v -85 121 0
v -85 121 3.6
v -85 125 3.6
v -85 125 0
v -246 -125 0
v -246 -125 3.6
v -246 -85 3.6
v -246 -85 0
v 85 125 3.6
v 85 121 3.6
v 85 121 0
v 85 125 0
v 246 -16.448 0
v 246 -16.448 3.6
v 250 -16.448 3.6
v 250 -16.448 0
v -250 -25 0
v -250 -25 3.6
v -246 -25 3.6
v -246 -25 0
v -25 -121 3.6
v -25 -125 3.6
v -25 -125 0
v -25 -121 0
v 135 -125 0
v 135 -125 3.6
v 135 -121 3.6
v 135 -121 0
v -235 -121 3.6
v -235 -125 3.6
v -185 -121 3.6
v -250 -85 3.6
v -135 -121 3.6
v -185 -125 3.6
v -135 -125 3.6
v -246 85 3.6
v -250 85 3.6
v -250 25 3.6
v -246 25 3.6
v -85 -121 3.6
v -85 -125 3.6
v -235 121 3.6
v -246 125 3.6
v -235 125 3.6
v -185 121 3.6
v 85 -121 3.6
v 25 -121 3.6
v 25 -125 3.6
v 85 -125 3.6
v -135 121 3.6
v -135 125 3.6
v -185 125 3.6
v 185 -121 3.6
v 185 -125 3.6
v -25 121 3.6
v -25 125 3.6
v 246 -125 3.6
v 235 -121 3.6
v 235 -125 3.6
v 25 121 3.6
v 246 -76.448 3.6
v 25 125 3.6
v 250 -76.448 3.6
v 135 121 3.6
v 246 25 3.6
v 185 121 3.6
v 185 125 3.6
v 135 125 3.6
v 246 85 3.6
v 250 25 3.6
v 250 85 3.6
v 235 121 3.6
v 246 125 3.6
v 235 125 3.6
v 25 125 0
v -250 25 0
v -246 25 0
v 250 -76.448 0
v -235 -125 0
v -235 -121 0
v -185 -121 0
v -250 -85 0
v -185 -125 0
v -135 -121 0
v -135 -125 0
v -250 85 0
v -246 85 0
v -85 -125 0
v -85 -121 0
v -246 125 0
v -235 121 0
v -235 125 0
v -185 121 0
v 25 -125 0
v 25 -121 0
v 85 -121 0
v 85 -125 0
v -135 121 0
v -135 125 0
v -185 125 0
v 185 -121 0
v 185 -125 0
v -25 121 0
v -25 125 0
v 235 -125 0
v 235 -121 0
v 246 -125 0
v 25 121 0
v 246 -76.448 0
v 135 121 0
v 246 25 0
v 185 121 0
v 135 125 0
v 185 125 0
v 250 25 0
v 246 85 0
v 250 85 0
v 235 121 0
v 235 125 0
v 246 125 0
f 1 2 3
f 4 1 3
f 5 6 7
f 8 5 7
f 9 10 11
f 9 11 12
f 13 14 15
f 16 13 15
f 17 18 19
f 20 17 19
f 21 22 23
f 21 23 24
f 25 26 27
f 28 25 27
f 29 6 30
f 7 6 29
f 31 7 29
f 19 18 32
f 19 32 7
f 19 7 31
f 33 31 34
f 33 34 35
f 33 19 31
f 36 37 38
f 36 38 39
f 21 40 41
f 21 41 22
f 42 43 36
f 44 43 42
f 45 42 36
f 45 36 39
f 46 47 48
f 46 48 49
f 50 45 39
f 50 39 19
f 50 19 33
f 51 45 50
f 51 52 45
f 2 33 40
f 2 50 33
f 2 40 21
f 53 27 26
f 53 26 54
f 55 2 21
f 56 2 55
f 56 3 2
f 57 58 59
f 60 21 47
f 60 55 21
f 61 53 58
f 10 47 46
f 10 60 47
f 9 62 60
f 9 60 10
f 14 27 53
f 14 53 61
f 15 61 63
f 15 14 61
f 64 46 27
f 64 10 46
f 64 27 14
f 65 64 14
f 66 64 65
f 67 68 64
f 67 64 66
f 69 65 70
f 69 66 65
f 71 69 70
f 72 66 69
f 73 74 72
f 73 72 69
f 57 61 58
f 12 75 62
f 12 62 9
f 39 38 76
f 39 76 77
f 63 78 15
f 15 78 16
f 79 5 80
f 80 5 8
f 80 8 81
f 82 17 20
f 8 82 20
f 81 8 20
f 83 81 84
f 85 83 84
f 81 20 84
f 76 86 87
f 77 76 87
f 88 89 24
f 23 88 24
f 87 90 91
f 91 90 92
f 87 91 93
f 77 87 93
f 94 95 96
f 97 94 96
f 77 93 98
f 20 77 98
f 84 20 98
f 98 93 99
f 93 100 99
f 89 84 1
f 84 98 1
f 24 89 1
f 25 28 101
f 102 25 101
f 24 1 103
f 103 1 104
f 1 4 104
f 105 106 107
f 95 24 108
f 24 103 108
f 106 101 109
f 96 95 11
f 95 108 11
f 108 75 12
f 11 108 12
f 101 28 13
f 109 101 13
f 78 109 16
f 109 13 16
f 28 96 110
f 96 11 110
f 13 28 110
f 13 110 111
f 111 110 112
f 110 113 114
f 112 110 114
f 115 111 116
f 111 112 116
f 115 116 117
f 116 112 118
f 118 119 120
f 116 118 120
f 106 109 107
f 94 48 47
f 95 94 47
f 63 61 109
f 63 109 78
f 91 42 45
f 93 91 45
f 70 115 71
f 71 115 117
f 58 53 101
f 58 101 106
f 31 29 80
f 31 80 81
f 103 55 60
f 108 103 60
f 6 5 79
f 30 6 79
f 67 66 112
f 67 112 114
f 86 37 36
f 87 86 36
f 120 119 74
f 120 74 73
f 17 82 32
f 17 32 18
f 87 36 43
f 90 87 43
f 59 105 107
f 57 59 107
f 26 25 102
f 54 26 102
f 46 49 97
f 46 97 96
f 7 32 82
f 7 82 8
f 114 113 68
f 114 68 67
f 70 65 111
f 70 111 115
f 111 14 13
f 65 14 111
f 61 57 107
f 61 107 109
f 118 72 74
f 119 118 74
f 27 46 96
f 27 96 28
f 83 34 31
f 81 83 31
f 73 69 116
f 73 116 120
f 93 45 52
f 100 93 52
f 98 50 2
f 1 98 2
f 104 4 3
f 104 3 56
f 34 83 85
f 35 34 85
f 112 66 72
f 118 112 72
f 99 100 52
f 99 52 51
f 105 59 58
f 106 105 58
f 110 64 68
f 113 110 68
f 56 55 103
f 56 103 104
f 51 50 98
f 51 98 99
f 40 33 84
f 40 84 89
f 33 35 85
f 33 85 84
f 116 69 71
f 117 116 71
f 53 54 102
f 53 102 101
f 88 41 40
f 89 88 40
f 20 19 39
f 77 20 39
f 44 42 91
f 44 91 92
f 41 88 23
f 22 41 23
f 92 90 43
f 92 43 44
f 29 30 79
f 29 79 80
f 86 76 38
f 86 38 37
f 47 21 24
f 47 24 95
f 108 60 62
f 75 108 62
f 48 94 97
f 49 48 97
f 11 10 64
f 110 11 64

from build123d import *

# Parameters (mm, degrees)
SKETCH_1_W          = 500
SKETCH_1_H          = 250
EXTRUDE_1_DEPTH     = 3.6
SKETCH_2_W          = 50
SKETCH_2_H          = 4
CUT_EXTRUDE_1_DEPTH = 3.6
SKETCH_3_W          = 4
SKETCH_3_H          = 50
SKETCH_3_H_2        = 41.448480175
CUT_EXTRUDE_2_DEPTH = 3.6


with BuildPart() as part:
    # 草图1 → 凸台-拉伸1 (new body)
    with BuildSketch(Plane.XY):
        Rectangle(SKETCH_1_W, SKETCH_1_H)
    extrude(amount=EXTRUDE_1_DEPTH)

    # 草图2 → 切除-拉伸1 (cut)
    with BuildSketch(Plane.XY.offset(3.6)):
        with Locations((0, 123)):
            Rectangle(SKETCH_2_W, SKETCH_2_H)
        with Locations((-110, 123)):
            Rectangle(SKETCH_2_W, SKETCH_2_H)
        with Locations((-210, 123)):
            Rectangle(SKETCH_2_W, SKETCH_2_H)
        with Locations((110, 123)):
            Rectangle(SKETCH_2_W, SKETCH_2_H)
        with Locations((210, 123)):
            Rectangle(SKETCH_2_W, SKETCH_2_H)
        with Locations((210, -123)):
            Rectangle(SKETCH_2_W, SKETCH_2_H)
        with Locations((110, -123)):
            Rectangle(SKETCH_2_W, SKETCH_2_H)
        with Locations((-210, -123)):
            Rectangle(SKETCH_2_W, SKETCH_2_H)
        with Locations((-110, -123)):
            Rectangle(SKETCH_2_W, SKETCH_2_H)
        with Locations((0, -123)):
            Rectangle(SKETCH_2_W, SKETCH_2_H)
    extrude(amount=-CUT_EXTRUDE_1_DEPTH, mode=Mode.SUBTRACT)

    # 草图3 → 切除-拉伸2 (cut)
    with BuildSketch(Plane.XY.offset(3.6)):
        with Locations((-248, 0)):
            Rectangle(SKETCH_3_W, SKETCH_3_H)
        with Locations((-248, 110)):
            Rectangle(SKETCH_3_W, SKETCH_3_H)
        with Locations((-248, -110)):
            Rectangle(SKETCH_3_W, SKETCH_3_H)
        with Locations((248, 4.275759912)):
            Rectangle(SKETCH_3_W, SKETCH_3_H_2)
        with Locations((248, -101.448480175)):
            Rectangle(SKETCH_3_W, SKETCH_3_H)
        with Locations((248, 110)):
            Rectangle(SKETCH_3_W, SKETCH_3_H)
    extrude(amount=-CUT_EXTRUDE_2_DEPTH, mode=Mode.SUBTRACT)


solid = part.part
